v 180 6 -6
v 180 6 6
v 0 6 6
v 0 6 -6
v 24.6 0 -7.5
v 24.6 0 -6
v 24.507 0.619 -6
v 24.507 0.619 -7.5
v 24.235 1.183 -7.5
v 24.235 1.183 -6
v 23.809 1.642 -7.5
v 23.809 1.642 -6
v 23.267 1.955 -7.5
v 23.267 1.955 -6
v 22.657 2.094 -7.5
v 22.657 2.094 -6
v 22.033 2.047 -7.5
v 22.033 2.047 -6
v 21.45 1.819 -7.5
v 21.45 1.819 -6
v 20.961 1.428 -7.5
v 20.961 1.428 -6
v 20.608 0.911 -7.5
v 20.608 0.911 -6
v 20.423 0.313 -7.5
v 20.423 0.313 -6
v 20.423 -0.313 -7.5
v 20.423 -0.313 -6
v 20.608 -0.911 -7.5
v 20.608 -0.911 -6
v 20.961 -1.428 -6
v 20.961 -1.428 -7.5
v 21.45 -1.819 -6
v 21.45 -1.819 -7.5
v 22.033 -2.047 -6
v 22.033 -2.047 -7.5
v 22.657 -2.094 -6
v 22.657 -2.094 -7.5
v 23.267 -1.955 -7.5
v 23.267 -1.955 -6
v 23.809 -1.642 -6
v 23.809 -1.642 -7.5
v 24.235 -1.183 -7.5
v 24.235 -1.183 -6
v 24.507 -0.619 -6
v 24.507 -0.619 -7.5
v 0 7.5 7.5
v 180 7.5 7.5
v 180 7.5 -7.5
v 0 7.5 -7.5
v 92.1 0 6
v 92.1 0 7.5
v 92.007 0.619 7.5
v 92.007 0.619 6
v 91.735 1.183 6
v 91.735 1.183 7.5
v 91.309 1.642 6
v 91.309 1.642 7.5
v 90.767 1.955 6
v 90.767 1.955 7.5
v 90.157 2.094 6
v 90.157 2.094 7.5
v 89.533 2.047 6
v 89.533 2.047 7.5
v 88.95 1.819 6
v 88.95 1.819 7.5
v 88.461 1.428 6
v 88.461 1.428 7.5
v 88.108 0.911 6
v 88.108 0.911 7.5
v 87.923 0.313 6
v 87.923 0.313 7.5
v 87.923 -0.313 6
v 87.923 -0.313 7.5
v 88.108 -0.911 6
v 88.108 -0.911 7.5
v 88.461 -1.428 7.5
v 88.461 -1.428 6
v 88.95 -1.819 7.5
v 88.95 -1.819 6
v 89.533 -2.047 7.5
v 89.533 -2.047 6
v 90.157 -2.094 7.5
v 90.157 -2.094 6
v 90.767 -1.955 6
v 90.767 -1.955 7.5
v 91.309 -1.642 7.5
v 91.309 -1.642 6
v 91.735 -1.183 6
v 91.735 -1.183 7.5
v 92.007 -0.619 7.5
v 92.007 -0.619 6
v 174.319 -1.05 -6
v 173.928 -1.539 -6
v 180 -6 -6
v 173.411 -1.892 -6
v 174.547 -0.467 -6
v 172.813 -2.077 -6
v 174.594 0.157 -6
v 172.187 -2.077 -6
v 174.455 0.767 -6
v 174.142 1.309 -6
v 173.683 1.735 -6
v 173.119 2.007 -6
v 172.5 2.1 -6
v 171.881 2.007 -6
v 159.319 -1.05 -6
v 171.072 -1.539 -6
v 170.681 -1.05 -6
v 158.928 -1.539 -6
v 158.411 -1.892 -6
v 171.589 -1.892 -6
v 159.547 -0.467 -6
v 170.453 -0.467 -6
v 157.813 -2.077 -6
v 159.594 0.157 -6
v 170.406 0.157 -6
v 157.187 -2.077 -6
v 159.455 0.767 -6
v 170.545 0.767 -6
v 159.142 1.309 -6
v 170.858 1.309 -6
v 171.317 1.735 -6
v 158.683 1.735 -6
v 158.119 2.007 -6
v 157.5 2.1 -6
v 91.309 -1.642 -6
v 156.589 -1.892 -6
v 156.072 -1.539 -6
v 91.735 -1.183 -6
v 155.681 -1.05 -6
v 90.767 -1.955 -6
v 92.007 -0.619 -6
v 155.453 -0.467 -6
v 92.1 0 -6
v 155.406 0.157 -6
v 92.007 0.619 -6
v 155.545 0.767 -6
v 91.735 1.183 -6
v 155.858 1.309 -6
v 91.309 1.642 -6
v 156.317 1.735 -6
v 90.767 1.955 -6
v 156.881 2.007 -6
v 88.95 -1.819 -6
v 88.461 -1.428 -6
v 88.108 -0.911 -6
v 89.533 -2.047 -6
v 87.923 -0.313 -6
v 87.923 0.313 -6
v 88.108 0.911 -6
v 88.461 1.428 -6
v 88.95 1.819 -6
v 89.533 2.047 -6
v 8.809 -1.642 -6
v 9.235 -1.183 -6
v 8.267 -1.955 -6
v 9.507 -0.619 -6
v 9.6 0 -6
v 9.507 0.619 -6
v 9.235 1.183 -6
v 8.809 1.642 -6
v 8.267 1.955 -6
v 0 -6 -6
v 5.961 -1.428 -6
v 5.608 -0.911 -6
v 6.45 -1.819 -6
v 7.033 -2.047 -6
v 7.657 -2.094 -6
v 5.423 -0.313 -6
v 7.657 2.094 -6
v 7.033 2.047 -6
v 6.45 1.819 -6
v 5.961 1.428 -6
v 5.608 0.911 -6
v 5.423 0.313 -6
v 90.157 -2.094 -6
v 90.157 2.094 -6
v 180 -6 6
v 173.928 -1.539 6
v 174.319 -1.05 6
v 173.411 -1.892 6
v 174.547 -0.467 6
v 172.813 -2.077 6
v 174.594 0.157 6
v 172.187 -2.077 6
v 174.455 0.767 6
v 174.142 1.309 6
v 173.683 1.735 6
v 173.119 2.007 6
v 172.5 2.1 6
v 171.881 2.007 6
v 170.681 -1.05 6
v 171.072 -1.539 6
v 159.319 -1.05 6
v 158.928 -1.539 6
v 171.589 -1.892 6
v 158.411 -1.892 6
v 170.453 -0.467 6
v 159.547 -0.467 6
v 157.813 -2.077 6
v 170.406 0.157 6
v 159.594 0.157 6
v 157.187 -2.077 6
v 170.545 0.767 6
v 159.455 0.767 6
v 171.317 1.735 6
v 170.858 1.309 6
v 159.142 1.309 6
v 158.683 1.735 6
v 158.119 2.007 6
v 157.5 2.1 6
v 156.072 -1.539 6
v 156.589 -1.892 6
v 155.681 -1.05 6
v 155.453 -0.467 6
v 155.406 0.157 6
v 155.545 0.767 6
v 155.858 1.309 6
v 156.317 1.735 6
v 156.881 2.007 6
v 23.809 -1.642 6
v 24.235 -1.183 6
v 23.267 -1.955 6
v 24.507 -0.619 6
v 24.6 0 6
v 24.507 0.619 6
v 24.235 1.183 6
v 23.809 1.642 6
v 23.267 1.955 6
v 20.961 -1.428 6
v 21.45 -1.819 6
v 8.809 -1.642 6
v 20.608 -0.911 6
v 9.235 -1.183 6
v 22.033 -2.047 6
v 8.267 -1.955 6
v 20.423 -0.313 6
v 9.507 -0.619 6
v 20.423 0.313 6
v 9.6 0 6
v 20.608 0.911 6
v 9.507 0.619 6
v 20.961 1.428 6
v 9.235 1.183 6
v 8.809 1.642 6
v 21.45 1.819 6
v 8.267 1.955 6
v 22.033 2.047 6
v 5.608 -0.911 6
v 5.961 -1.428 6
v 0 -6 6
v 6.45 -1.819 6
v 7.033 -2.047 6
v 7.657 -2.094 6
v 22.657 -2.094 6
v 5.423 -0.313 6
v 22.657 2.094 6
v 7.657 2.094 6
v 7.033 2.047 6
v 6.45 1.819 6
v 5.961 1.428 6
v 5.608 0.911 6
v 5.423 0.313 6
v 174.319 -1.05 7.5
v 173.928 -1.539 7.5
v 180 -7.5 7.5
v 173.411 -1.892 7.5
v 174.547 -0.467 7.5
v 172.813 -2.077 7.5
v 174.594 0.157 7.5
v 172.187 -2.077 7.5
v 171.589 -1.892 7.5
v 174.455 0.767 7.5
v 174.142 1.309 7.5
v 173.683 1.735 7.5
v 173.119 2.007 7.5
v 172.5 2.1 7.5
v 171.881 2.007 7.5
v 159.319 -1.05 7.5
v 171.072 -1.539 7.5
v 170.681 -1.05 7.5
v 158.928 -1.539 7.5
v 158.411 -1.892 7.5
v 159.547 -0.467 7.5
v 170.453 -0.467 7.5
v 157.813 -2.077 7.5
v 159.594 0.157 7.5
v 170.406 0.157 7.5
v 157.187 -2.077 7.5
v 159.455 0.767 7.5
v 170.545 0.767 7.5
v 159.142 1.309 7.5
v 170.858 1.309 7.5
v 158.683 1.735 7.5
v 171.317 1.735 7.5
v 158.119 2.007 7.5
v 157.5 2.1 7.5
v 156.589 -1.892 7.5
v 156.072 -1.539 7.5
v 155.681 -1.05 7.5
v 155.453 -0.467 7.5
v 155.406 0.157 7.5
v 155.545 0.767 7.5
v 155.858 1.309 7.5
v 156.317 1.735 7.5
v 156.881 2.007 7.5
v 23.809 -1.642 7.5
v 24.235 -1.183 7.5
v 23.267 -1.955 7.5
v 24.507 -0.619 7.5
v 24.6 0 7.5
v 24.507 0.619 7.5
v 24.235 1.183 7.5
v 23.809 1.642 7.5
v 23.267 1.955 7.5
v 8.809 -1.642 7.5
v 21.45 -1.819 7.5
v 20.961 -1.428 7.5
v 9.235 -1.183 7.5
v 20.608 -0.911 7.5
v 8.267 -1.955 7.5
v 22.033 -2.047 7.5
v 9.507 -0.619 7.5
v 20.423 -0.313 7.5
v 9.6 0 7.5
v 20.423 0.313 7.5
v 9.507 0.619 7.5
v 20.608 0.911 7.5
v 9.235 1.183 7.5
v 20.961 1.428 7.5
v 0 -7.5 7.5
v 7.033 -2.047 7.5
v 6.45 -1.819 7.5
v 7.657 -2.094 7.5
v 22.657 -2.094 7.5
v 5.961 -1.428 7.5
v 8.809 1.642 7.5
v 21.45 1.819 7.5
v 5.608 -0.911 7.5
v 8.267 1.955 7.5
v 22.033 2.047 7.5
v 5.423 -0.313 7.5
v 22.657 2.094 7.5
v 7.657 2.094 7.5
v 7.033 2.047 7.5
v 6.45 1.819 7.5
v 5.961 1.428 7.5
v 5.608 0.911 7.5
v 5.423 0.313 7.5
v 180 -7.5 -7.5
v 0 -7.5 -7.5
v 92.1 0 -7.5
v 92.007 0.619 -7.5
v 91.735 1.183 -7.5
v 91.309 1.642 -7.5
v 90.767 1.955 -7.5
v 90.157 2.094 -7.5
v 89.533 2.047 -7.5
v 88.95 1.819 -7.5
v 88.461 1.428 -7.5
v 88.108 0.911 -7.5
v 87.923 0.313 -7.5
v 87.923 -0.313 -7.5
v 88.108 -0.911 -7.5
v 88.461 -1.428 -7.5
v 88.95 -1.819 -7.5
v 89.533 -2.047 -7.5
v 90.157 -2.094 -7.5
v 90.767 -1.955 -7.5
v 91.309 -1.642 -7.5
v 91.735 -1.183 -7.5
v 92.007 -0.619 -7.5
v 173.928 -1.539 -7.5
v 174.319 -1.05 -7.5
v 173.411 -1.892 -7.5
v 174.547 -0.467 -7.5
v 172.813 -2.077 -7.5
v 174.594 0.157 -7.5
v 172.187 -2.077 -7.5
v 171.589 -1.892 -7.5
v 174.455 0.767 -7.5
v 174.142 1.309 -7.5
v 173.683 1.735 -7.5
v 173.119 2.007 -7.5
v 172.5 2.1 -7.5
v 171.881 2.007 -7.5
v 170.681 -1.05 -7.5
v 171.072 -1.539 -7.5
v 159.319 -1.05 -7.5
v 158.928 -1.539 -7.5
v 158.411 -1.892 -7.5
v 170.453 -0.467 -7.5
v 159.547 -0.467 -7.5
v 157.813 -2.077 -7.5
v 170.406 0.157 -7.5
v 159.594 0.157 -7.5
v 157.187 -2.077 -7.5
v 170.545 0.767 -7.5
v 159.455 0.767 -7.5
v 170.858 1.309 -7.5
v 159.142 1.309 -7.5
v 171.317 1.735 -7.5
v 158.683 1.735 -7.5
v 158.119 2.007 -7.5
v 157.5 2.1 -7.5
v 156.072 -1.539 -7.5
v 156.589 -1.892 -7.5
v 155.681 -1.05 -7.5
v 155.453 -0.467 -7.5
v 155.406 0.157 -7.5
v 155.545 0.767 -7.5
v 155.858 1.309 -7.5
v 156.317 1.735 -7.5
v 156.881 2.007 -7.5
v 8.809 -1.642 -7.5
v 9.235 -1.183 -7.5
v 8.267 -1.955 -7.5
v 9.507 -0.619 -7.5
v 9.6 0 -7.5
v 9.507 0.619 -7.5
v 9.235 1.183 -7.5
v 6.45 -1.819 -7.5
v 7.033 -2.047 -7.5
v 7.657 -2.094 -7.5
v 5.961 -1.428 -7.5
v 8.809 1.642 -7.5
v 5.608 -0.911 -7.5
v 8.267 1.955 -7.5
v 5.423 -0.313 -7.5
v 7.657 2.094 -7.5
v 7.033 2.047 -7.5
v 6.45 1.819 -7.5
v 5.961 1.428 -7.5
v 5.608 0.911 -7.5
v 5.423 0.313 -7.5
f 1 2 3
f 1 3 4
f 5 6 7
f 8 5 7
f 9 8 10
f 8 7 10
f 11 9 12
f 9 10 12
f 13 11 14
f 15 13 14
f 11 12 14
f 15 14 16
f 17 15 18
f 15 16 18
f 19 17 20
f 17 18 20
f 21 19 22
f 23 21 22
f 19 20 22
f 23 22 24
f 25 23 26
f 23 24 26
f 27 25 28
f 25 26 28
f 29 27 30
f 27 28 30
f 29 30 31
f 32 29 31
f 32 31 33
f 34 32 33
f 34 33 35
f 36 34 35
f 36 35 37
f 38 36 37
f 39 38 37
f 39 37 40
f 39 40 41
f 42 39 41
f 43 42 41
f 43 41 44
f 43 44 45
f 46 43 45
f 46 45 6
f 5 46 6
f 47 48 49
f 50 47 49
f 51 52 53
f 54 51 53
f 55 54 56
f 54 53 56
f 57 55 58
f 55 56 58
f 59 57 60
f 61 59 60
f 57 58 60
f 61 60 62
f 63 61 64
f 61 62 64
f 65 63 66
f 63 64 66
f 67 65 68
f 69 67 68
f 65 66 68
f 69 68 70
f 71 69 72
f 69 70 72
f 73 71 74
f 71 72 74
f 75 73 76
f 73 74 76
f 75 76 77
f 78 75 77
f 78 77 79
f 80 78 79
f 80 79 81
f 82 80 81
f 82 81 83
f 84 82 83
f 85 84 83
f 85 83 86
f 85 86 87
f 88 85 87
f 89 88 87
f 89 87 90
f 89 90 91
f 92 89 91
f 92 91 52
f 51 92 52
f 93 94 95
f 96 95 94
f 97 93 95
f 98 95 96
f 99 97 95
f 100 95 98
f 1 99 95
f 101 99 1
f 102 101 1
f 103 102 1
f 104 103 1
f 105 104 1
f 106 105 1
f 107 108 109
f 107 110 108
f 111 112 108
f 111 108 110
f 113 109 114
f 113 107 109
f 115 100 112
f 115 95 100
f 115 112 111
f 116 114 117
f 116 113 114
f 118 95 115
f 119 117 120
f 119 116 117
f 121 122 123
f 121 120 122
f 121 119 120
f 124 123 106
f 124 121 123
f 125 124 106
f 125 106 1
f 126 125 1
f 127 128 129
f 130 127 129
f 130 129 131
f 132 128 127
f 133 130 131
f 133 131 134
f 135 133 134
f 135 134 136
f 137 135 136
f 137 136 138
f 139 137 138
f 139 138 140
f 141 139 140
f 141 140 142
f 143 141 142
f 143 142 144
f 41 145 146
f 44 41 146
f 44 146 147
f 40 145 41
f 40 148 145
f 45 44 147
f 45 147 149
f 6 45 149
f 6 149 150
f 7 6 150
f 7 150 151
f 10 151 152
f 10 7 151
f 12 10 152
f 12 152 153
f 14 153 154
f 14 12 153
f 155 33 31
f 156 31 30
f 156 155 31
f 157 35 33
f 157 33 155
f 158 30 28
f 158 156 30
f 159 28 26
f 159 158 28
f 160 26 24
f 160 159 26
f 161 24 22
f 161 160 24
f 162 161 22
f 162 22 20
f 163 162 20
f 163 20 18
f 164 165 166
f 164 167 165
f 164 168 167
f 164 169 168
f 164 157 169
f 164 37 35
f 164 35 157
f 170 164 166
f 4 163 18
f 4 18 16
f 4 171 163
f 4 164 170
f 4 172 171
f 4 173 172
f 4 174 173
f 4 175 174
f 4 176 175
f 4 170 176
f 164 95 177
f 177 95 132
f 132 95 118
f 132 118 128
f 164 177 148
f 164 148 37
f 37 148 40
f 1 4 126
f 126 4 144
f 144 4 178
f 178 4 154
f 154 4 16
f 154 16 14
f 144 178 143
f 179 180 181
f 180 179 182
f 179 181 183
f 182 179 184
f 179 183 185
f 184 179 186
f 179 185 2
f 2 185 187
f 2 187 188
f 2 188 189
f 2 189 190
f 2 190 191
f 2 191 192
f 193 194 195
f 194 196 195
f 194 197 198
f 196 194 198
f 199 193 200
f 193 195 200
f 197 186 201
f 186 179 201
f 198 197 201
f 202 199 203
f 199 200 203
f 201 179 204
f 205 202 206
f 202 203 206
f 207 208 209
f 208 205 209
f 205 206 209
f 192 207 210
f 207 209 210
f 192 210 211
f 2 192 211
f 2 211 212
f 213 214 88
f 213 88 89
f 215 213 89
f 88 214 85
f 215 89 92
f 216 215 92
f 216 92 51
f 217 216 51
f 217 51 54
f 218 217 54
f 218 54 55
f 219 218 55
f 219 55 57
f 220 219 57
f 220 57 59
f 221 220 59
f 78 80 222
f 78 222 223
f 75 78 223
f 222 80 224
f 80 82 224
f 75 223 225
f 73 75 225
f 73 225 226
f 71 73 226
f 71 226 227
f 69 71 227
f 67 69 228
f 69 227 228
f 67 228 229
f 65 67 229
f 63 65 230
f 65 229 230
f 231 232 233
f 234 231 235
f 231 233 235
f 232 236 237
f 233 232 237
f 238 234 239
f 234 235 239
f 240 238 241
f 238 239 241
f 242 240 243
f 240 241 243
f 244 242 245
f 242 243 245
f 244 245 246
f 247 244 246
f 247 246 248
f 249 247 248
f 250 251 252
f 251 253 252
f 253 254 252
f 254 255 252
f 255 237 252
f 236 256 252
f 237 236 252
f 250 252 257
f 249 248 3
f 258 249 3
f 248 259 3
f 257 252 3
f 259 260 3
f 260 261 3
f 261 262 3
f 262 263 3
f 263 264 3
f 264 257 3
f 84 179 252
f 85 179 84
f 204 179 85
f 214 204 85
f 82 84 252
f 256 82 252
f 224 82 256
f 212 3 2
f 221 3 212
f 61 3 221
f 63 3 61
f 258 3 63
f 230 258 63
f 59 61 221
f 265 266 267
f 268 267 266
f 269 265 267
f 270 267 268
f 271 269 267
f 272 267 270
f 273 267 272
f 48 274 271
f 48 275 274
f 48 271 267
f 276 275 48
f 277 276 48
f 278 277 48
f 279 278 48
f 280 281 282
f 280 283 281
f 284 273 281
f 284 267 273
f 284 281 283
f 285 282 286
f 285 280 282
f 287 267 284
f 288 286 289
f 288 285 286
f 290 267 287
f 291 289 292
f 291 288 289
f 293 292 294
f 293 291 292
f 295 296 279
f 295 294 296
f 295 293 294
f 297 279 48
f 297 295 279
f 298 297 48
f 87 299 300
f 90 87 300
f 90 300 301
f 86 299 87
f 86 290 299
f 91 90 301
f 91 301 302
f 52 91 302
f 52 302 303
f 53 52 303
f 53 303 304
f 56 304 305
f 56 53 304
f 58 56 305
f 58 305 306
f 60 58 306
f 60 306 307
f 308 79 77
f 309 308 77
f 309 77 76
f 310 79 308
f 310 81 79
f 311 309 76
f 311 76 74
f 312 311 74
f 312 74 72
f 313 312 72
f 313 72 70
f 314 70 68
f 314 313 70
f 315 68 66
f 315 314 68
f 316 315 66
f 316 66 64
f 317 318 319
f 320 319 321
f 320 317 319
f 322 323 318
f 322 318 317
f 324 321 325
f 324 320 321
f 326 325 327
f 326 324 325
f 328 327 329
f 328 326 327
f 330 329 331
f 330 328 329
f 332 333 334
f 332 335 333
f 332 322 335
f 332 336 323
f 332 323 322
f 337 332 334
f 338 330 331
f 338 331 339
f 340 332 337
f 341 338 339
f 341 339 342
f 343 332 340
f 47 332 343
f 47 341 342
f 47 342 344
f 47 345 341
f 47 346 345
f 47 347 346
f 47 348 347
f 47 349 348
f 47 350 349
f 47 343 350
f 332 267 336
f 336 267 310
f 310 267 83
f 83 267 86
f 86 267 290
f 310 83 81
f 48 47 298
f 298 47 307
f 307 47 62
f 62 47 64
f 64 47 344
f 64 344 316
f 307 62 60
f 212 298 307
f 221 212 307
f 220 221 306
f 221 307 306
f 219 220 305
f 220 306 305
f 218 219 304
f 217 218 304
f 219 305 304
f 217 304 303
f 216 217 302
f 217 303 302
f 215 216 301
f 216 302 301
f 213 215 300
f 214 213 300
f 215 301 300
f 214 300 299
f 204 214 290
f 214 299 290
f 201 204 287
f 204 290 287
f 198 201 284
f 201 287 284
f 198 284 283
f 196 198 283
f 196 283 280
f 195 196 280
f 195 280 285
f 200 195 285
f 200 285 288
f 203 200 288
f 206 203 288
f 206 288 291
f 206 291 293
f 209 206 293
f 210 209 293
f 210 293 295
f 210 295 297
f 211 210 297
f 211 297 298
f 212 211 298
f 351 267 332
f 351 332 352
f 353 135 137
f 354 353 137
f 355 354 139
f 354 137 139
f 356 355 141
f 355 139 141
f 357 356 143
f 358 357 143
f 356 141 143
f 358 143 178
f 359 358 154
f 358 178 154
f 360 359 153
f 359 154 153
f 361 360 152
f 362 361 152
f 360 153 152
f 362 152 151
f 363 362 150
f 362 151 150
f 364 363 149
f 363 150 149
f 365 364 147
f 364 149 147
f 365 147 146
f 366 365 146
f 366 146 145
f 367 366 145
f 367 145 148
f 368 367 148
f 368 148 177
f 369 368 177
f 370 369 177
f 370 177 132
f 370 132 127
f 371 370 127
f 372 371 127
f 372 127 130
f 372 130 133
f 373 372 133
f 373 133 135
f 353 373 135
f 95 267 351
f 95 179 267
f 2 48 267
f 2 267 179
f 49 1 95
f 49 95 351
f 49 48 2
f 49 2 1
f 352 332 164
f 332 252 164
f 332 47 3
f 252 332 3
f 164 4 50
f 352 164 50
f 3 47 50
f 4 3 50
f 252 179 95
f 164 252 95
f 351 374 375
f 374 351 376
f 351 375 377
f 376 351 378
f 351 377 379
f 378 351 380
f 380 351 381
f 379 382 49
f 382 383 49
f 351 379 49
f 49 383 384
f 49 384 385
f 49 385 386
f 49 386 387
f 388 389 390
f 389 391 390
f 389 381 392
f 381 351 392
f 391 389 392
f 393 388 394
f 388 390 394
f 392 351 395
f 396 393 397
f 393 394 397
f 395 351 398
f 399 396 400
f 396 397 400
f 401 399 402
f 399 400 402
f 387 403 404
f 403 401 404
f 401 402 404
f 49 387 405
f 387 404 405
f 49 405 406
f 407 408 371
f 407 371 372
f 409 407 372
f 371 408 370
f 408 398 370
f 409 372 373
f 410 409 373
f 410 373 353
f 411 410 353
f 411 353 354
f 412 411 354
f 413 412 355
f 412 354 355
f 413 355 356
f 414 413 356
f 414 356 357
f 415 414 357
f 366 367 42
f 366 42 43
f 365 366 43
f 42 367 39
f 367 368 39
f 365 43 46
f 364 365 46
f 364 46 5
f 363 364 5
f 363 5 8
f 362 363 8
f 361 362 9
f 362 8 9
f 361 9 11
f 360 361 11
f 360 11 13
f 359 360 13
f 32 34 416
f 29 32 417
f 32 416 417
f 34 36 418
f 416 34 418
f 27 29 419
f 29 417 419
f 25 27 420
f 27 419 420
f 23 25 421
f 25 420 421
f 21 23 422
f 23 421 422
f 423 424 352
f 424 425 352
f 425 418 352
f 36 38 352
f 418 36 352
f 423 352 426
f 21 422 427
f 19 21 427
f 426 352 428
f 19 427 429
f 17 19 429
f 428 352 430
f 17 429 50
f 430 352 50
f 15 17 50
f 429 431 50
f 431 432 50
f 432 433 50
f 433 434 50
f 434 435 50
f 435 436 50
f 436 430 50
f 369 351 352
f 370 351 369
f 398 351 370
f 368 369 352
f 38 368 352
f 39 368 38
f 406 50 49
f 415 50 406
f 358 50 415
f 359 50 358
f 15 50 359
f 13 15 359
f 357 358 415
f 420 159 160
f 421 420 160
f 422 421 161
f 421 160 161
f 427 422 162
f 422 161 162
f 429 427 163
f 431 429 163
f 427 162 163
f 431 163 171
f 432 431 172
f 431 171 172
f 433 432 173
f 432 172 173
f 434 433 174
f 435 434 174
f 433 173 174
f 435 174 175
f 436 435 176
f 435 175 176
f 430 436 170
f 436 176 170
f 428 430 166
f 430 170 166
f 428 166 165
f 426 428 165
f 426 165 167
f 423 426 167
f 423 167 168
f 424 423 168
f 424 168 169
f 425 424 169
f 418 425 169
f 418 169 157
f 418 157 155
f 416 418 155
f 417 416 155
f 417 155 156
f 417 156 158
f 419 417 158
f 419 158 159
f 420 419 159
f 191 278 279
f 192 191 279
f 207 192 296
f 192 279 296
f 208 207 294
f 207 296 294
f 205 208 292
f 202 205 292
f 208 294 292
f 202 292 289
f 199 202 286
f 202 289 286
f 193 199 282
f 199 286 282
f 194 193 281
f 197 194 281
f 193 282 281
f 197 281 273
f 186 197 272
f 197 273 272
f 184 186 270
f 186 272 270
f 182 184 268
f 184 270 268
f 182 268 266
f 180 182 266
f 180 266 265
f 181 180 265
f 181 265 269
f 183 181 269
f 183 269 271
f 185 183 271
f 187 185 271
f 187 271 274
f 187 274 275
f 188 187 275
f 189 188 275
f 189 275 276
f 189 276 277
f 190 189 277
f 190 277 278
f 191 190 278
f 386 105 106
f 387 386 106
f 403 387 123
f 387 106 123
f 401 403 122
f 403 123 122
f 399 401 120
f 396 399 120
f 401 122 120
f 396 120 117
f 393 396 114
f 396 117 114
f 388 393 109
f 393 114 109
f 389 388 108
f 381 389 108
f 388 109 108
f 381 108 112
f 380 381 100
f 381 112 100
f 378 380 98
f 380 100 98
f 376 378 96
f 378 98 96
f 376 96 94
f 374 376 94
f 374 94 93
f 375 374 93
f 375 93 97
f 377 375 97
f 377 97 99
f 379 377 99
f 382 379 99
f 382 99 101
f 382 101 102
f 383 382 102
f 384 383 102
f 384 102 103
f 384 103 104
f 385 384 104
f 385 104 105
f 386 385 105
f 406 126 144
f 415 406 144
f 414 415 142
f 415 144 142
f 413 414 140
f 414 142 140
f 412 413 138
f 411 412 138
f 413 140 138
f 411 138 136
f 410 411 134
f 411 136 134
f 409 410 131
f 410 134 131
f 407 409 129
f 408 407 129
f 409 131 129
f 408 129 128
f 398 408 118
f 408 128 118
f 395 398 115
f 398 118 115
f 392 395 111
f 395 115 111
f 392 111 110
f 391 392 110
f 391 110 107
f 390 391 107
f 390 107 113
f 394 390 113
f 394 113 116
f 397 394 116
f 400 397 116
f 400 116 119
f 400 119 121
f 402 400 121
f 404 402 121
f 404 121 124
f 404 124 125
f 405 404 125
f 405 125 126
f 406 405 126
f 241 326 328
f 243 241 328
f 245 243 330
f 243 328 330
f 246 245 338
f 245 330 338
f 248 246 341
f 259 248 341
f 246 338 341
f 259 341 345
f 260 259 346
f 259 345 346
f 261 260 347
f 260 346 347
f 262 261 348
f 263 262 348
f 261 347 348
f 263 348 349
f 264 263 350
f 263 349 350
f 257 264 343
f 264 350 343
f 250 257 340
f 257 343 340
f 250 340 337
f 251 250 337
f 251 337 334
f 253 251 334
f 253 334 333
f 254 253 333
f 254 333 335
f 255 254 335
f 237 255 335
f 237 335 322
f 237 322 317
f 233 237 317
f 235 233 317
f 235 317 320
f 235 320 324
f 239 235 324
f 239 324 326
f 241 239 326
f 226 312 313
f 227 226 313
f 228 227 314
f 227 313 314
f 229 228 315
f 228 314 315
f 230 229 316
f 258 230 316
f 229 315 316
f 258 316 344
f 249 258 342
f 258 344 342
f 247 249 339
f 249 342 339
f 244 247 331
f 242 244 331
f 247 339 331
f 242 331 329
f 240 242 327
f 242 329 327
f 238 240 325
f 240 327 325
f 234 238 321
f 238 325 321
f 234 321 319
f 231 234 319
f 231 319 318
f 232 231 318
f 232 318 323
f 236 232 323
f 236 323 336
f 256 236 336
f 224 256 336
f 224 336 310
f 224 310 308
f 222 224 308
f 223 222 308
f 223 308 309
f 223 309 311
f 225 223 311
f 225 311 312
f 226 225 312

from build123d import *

# Parameters (mm, degrees)
SKETCH_1_W          = 15
SKETCH_1_H          = 15
SKETCH_1_W_2        = 12
SKETCH_1_H_2        = 12
EXTRUDE_1_DEPTH     = 180
SKETCH_2_R          = 2.1
CUT_EXTRUDE_1_DEPTH = 181.779561898


with BuildPart() as part:
    # ｽｹｯﾁ1 → 押し出し-薄板1 (new body)
    with BuildSketch(Plane(origin=(0, 0, 0), x_dir=(0, 0, -1), z_dir=(1, 0, 0))):
        Rectangle(SKETCH_1_W, SKETCH_1_H)
        Rectangle(SKETCH_1_W_2, SKETCH_1_H_2, mode=Mode.SUBTRACT)
    extrude(amount=EXTRUDE_1_DEPTH)

    # ｽｹｯﾁ2 → ｶｯﾄ - 押し出し1 (cut, through all)
    with BuildSketch(Plane.XY.offset(7.5)):
        with Locations((22.5, 0)):
            Circle(SKETCH_2_R)
        with Locations((7.5, 0)):
            Circle(SKETCH_2_R)
        with Locations(Location((172.5, 0, 0), (0, 0, 90))):
            Circle(SKETCH_2_R)
        with Locations(Location((157.5, 0, 0), (0, 0, 90))):
            Circle(SKETCH_2_R)
        with Locations((90, 0)):
            Circle(SKETCH_2_R)
    extrude(amount=-CUT_EXTRUDE_1_DEPTH, mode=Mode.SUBTRACT)


solid = part.part
